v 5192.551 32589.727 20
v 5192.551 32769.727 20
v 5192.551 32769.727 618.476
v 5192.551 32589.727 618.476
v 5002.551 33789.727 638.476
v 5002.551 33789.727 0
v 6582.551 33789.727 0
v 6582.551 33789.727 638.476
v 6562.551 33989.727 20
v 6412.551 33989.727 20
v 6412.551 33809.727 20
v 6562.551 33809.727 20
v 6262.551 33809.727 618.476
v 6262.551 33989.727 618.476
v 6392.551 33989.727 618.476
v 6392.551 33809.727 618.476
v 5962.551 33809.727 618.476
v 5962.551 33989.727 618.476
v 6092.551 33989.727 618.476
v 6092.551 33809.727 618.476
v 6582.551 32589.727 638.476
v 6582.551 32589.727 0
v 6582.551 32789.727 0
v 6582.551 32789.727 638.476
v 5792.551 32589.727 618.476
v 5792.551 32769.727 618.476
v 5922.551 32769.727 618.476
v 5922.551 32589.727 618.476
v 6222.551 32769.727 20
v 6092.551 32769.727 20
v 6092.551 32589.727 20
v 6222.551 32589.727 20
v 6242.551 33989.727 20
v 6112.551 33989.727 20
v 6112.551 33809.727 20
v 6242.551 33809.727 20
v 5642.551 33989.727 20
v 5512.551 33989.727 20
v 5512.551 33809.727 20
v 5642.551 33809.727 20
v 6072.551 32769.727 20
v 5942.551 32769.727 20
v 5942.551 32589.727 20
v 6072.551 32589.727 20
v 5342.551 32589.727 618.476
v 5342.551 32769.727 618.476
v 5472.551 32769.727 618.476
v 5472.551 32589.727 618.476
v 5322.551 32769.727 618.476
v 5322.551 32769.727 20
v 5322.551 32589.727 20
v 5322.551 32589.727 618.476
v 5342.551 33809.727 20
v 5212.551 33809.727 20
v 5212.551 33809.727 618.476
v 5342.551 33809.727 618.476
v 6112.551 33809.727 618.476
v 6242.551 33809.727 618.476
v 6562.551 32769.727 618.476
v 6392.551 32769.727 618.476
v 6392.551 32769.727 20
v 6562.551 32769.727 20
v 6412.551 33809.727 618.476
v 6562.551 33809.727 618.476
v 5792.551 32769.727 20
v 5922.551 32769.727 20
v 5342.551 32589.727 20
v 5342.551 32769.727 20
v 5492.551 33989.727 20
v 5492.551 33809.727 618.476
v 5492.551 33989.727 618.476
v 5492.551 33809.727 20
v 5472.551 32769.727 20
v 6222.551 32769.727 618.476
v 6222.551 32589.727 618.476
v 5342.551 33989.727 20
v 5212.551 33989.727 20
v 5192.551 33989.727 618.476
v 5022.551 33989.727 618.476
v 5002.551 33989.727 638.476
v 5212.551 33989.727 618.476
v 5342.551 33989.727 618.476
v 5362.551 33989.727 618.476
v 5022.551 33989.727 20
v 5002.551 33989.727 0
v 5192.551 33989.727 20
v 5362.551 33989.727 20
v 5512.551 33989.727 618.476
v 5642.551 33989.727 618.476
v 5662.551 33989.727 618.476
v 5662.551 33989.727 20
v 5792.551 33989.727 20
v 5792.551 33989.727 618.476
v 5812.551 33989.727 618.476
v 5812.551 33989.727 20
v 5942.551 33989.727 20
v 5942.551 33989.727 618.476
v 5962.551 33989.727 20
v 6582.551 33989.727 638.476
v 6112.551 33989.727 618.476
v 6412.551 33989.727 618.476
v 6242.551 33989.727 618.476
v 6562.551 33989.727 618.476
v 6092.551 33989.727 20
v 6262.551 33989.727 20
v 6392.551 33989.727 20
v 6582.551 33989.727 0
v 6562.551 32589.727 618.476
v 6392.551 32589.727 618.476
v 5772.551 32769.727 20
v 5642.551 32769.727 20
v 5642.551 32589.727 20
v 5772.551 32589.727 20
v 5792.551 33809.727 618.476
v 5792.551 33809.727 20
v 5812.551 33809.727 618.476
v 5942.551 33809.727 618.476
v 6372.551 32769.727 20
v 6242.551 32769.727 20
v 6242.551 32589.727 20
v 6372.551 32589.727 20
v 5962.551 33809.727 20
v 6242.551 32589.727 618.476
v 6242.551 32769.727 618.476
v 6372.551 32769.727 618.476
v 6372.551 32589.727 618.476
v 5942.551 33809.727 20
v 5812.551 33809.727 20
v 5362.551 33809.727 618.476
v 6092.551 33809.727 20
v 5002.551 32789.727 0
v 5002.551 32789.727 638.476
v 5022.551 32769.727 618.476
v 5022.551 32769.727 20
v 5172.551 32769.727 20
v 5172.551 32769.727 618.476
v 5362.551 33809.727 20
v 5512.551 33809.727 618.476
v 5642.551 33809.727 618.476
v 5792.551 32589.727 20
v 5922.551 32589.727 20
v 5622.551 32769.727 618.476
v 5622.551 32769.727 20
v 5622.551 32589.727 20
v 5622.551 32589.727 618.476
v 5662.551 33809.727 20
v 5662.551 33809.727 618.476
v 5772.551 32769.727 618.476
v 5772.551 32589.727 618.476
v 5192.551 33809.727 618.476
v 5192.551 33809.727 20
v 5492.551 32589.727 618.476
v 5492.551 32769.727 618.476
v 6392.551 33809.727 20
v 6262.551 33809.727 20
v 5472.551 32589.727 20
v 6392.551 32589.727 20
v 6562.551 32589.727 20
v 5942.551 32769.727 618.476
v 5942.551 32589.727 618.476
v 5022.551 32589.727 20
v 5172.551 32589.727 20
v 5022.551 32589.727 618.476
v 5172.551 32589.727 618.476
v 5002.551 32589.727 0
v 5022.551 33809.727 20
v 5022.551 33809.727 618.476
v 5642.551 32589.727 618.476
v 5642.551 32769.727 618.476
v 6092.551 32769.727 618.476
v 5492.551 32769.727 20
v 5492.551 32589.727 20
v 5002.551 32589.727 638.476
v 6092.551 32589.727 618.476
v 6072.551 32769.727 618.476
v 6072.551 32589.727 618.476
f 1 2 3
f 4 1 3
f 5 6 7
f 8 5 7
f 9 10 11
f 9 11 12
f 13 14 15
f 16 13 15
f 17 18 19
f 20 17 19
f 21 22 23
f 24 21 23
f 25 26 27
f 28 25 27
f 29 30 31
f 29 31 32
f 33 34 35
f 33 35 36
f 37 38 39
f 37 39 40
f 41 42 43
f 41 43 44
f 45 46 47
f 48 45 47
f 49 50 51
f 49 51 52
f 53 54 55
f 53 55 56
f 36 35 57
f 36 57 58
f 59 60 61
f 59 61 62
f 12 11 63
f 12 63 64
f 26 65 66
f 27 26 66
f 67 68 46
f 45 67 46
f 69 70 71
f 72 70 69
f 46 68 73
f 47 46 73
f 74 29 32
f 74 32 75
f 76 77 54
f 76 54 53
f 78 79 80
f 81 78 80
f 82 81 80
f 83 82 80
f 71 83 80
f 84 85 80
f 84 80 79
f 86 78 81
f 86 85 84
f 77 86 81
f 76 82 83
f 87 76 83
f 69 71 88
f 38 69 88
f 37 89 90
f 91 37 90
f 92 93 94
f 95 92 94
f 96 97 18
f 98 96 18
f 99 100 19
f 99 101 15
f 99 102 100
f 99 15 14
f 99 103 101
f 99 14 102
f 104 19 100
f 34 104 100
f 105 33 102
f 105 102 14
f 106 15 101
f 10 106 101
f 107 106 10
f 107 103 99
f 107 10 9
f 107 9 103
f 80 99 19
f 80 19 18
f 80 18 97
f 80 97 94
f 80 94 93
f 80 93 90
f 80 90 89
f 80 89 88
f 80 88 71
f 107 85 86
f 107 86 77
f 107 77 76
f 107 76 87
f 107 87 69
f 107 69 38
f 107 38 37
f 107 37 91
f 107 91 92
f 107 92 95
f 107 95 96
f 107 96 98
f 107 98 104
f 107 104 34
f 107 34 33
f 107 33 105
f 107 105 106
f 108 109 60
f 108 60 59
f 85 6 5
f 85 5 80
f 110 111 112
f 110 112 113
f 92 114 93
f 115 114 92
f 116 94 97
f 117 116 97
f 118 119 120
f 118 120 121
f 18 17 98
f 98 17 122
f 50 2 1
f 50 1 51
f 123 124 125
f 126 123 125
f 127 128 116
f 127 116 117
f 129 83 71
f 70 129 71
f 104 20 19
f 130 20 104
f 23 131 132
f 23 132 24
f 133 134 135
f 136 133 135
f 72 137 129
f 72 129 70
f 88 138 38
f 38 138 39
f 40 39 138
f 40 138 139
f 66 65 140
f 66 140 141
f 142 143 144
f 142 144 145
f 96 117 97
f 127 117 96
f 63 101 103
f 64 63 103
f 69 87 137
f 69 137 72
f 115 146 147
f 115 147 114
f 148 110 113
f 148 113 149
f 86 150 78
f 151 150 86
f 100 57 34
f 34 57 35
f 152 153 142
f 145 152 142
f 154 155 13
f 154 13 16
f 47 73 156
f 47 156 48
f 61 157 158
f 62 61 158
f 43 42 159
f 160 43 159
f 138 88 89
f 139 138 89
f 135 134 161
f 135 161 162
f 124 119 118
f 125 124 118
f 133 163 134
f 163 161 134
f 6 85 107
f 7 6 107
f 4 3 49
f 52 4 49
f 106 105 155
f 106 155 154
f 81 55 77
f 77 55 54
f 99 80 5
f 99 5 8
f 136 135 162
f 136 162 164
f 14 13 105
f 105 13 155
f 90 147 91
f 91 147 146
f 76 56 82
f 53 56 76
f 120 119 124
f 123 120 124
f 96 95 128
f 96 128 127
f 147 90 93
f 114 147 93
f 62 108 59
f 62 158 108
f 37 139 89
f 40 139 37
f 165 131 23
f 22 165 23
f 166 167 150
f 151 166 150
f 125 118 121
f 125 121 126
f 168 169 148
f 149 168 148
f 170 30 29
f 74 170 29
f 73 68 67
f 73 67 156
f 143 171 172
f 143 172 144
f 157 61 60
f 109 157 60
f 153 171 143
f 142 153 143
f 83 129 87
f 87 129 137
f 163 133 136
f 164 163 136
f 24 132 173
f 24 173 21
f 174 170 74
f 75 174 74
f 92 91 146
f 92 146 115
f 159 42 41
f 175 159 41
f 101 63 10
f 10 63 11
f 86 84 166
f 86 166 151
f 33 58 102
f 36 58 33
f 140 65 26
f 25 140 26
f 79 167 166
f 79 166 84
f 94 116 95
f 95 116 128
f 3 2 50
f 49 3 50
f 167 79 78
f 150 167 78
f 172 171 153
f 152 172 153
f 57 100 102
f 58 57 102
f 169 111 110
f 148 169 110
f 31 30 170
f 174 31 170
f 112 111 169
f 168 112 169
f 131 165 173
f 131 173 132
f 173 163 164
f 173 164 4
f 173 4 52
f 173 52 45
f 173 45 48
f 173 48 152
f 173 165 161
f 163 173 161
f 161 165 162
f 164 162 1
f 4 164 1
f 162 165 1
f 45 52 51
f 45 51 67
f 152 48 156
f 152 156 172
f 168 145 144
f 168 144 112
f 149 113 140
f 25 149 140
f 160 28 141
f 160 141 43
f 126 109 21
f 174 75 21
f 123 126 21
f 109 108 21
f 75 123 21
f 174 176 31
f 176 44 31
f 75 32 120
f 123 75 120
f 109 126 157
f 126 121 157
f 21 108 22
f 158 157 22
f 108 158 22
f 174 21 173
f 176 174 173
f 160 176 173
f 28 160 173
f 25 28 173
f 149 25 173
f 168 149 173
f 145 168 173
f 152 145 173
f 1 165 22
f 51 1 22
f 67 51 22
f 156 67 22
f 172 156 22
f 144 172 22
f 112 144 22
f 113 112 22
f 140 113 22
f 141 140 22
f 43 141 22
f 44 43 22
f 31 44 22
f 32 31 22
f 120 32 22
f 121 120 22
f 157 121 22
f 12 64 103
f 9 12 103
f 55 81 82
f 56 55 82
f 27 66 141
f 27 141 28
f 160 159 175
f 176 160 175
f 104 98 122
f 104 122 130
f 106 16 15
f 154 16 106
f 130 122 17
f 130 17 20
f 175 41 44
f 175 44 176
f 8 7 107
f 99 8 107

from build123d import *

# Parameters (mm, degrees)
SKETCH2_W        = 1580
SKETCH2_H        = 200
EXTRUDE1_DEPTH   = 638.476
EXTRUDE1_2_DEPTH = 638.476
SHELL1_T         = -20
SHELL2_T         = -20
SKETCH3_W        = 20
SKETCH3_H        = 598.476
EXTRUDE2_DEPTH   = 180
LPATTERN1_COUNT  = 9
LPATTERN1_PITCH  = 150
SKETCH4_W        = 20
SKETCH4_H        = 598.476
EXTRUDE3_DEPTH   = 180
LPATTERN2_COUNT  = 9
LPATTERN2_PITCH  = 150


with BuildPart() as part:
    # Sketch2 → Extrude1 (new body)
    with BuildSketch(Plane.XY):
        with Locations((5792.550750519, 33889.726718834)):
            Rectangle(SKETCH2_W, SKETCH2_H)
    extrude(amount=EXTRUDE1_DEPTH)

    # Shell2
    shell2_openings = [part.faces().sort_by_distance(p)[0] for p in [
        (5792.550750519, 33989.726718834, 319.238),
    ]]
    offset(amount=SHELL2_T, openings=shell2_openings, kind=Kind.INTERSECTION)

    # Sketch4 → Extrude3 (add)
    with BuildSketch(Plane(origin=(0, 33809.726718834, 0), x_dir=(1, 0, 0), z_dir=(0, 1, 0))):
        with Locations((6402.550750519, -319.238)):
            Rectangle(SKETCH4_W, SKETCH4_H)
    extrude3 = extrude(amount=EXTRUDE3_DEPTH)

    # LPattern2: Extrude3 ×9
    with Locations(*[(-i * LPATTERN2_PITCH, 0, 0) for i in range(1, LPATTERN2_COUNT)]):
        add(extrude3)


with BuildPart() as body_2:
    # Sketch2 → Extrude1 2 (new body)
    with BuildSketch(Plane.XY):
        with Locations((5792.550750519, 32689.726718834)):
            Rectangle(SKETCH2_W, SKETCH2_H)
    extrude(amount=EXTRUDE1_2_DEPTH)

    # Shell1
    shell1_openings = [body_2.faces().sort_by_distance(p)[0] for p in [
        (5792.550750519, 32589.726718834, 319.238),
    ]]
    offset(amount=SHELL1_T, openings=shell1_openings, kind=Kind.INTERSECTION)

    # Sketch3 → Extrude2 (add)
    with BuildSketch(Plane(origin=(0, 32769.726718834, 0), x_dir=(1, 0, 0), z_dir=(0, -1, 0))):
        with Locations((5182.550750519, 319.238)):
            Rectangle(SKETCH3_W, SKETCH3_H)
    extrude2 = extrude(amount=EXTRUDE2_DEPTH)

    # LPattern1: Extrude2 ×9
    with Locations(*[(i * LPATTERN1_PITCH, 0, 0) for i in range(1, LPATTERN1_COUNT)]):
        add(extrude2)


solid = Compound([part.part, body_2.part])
